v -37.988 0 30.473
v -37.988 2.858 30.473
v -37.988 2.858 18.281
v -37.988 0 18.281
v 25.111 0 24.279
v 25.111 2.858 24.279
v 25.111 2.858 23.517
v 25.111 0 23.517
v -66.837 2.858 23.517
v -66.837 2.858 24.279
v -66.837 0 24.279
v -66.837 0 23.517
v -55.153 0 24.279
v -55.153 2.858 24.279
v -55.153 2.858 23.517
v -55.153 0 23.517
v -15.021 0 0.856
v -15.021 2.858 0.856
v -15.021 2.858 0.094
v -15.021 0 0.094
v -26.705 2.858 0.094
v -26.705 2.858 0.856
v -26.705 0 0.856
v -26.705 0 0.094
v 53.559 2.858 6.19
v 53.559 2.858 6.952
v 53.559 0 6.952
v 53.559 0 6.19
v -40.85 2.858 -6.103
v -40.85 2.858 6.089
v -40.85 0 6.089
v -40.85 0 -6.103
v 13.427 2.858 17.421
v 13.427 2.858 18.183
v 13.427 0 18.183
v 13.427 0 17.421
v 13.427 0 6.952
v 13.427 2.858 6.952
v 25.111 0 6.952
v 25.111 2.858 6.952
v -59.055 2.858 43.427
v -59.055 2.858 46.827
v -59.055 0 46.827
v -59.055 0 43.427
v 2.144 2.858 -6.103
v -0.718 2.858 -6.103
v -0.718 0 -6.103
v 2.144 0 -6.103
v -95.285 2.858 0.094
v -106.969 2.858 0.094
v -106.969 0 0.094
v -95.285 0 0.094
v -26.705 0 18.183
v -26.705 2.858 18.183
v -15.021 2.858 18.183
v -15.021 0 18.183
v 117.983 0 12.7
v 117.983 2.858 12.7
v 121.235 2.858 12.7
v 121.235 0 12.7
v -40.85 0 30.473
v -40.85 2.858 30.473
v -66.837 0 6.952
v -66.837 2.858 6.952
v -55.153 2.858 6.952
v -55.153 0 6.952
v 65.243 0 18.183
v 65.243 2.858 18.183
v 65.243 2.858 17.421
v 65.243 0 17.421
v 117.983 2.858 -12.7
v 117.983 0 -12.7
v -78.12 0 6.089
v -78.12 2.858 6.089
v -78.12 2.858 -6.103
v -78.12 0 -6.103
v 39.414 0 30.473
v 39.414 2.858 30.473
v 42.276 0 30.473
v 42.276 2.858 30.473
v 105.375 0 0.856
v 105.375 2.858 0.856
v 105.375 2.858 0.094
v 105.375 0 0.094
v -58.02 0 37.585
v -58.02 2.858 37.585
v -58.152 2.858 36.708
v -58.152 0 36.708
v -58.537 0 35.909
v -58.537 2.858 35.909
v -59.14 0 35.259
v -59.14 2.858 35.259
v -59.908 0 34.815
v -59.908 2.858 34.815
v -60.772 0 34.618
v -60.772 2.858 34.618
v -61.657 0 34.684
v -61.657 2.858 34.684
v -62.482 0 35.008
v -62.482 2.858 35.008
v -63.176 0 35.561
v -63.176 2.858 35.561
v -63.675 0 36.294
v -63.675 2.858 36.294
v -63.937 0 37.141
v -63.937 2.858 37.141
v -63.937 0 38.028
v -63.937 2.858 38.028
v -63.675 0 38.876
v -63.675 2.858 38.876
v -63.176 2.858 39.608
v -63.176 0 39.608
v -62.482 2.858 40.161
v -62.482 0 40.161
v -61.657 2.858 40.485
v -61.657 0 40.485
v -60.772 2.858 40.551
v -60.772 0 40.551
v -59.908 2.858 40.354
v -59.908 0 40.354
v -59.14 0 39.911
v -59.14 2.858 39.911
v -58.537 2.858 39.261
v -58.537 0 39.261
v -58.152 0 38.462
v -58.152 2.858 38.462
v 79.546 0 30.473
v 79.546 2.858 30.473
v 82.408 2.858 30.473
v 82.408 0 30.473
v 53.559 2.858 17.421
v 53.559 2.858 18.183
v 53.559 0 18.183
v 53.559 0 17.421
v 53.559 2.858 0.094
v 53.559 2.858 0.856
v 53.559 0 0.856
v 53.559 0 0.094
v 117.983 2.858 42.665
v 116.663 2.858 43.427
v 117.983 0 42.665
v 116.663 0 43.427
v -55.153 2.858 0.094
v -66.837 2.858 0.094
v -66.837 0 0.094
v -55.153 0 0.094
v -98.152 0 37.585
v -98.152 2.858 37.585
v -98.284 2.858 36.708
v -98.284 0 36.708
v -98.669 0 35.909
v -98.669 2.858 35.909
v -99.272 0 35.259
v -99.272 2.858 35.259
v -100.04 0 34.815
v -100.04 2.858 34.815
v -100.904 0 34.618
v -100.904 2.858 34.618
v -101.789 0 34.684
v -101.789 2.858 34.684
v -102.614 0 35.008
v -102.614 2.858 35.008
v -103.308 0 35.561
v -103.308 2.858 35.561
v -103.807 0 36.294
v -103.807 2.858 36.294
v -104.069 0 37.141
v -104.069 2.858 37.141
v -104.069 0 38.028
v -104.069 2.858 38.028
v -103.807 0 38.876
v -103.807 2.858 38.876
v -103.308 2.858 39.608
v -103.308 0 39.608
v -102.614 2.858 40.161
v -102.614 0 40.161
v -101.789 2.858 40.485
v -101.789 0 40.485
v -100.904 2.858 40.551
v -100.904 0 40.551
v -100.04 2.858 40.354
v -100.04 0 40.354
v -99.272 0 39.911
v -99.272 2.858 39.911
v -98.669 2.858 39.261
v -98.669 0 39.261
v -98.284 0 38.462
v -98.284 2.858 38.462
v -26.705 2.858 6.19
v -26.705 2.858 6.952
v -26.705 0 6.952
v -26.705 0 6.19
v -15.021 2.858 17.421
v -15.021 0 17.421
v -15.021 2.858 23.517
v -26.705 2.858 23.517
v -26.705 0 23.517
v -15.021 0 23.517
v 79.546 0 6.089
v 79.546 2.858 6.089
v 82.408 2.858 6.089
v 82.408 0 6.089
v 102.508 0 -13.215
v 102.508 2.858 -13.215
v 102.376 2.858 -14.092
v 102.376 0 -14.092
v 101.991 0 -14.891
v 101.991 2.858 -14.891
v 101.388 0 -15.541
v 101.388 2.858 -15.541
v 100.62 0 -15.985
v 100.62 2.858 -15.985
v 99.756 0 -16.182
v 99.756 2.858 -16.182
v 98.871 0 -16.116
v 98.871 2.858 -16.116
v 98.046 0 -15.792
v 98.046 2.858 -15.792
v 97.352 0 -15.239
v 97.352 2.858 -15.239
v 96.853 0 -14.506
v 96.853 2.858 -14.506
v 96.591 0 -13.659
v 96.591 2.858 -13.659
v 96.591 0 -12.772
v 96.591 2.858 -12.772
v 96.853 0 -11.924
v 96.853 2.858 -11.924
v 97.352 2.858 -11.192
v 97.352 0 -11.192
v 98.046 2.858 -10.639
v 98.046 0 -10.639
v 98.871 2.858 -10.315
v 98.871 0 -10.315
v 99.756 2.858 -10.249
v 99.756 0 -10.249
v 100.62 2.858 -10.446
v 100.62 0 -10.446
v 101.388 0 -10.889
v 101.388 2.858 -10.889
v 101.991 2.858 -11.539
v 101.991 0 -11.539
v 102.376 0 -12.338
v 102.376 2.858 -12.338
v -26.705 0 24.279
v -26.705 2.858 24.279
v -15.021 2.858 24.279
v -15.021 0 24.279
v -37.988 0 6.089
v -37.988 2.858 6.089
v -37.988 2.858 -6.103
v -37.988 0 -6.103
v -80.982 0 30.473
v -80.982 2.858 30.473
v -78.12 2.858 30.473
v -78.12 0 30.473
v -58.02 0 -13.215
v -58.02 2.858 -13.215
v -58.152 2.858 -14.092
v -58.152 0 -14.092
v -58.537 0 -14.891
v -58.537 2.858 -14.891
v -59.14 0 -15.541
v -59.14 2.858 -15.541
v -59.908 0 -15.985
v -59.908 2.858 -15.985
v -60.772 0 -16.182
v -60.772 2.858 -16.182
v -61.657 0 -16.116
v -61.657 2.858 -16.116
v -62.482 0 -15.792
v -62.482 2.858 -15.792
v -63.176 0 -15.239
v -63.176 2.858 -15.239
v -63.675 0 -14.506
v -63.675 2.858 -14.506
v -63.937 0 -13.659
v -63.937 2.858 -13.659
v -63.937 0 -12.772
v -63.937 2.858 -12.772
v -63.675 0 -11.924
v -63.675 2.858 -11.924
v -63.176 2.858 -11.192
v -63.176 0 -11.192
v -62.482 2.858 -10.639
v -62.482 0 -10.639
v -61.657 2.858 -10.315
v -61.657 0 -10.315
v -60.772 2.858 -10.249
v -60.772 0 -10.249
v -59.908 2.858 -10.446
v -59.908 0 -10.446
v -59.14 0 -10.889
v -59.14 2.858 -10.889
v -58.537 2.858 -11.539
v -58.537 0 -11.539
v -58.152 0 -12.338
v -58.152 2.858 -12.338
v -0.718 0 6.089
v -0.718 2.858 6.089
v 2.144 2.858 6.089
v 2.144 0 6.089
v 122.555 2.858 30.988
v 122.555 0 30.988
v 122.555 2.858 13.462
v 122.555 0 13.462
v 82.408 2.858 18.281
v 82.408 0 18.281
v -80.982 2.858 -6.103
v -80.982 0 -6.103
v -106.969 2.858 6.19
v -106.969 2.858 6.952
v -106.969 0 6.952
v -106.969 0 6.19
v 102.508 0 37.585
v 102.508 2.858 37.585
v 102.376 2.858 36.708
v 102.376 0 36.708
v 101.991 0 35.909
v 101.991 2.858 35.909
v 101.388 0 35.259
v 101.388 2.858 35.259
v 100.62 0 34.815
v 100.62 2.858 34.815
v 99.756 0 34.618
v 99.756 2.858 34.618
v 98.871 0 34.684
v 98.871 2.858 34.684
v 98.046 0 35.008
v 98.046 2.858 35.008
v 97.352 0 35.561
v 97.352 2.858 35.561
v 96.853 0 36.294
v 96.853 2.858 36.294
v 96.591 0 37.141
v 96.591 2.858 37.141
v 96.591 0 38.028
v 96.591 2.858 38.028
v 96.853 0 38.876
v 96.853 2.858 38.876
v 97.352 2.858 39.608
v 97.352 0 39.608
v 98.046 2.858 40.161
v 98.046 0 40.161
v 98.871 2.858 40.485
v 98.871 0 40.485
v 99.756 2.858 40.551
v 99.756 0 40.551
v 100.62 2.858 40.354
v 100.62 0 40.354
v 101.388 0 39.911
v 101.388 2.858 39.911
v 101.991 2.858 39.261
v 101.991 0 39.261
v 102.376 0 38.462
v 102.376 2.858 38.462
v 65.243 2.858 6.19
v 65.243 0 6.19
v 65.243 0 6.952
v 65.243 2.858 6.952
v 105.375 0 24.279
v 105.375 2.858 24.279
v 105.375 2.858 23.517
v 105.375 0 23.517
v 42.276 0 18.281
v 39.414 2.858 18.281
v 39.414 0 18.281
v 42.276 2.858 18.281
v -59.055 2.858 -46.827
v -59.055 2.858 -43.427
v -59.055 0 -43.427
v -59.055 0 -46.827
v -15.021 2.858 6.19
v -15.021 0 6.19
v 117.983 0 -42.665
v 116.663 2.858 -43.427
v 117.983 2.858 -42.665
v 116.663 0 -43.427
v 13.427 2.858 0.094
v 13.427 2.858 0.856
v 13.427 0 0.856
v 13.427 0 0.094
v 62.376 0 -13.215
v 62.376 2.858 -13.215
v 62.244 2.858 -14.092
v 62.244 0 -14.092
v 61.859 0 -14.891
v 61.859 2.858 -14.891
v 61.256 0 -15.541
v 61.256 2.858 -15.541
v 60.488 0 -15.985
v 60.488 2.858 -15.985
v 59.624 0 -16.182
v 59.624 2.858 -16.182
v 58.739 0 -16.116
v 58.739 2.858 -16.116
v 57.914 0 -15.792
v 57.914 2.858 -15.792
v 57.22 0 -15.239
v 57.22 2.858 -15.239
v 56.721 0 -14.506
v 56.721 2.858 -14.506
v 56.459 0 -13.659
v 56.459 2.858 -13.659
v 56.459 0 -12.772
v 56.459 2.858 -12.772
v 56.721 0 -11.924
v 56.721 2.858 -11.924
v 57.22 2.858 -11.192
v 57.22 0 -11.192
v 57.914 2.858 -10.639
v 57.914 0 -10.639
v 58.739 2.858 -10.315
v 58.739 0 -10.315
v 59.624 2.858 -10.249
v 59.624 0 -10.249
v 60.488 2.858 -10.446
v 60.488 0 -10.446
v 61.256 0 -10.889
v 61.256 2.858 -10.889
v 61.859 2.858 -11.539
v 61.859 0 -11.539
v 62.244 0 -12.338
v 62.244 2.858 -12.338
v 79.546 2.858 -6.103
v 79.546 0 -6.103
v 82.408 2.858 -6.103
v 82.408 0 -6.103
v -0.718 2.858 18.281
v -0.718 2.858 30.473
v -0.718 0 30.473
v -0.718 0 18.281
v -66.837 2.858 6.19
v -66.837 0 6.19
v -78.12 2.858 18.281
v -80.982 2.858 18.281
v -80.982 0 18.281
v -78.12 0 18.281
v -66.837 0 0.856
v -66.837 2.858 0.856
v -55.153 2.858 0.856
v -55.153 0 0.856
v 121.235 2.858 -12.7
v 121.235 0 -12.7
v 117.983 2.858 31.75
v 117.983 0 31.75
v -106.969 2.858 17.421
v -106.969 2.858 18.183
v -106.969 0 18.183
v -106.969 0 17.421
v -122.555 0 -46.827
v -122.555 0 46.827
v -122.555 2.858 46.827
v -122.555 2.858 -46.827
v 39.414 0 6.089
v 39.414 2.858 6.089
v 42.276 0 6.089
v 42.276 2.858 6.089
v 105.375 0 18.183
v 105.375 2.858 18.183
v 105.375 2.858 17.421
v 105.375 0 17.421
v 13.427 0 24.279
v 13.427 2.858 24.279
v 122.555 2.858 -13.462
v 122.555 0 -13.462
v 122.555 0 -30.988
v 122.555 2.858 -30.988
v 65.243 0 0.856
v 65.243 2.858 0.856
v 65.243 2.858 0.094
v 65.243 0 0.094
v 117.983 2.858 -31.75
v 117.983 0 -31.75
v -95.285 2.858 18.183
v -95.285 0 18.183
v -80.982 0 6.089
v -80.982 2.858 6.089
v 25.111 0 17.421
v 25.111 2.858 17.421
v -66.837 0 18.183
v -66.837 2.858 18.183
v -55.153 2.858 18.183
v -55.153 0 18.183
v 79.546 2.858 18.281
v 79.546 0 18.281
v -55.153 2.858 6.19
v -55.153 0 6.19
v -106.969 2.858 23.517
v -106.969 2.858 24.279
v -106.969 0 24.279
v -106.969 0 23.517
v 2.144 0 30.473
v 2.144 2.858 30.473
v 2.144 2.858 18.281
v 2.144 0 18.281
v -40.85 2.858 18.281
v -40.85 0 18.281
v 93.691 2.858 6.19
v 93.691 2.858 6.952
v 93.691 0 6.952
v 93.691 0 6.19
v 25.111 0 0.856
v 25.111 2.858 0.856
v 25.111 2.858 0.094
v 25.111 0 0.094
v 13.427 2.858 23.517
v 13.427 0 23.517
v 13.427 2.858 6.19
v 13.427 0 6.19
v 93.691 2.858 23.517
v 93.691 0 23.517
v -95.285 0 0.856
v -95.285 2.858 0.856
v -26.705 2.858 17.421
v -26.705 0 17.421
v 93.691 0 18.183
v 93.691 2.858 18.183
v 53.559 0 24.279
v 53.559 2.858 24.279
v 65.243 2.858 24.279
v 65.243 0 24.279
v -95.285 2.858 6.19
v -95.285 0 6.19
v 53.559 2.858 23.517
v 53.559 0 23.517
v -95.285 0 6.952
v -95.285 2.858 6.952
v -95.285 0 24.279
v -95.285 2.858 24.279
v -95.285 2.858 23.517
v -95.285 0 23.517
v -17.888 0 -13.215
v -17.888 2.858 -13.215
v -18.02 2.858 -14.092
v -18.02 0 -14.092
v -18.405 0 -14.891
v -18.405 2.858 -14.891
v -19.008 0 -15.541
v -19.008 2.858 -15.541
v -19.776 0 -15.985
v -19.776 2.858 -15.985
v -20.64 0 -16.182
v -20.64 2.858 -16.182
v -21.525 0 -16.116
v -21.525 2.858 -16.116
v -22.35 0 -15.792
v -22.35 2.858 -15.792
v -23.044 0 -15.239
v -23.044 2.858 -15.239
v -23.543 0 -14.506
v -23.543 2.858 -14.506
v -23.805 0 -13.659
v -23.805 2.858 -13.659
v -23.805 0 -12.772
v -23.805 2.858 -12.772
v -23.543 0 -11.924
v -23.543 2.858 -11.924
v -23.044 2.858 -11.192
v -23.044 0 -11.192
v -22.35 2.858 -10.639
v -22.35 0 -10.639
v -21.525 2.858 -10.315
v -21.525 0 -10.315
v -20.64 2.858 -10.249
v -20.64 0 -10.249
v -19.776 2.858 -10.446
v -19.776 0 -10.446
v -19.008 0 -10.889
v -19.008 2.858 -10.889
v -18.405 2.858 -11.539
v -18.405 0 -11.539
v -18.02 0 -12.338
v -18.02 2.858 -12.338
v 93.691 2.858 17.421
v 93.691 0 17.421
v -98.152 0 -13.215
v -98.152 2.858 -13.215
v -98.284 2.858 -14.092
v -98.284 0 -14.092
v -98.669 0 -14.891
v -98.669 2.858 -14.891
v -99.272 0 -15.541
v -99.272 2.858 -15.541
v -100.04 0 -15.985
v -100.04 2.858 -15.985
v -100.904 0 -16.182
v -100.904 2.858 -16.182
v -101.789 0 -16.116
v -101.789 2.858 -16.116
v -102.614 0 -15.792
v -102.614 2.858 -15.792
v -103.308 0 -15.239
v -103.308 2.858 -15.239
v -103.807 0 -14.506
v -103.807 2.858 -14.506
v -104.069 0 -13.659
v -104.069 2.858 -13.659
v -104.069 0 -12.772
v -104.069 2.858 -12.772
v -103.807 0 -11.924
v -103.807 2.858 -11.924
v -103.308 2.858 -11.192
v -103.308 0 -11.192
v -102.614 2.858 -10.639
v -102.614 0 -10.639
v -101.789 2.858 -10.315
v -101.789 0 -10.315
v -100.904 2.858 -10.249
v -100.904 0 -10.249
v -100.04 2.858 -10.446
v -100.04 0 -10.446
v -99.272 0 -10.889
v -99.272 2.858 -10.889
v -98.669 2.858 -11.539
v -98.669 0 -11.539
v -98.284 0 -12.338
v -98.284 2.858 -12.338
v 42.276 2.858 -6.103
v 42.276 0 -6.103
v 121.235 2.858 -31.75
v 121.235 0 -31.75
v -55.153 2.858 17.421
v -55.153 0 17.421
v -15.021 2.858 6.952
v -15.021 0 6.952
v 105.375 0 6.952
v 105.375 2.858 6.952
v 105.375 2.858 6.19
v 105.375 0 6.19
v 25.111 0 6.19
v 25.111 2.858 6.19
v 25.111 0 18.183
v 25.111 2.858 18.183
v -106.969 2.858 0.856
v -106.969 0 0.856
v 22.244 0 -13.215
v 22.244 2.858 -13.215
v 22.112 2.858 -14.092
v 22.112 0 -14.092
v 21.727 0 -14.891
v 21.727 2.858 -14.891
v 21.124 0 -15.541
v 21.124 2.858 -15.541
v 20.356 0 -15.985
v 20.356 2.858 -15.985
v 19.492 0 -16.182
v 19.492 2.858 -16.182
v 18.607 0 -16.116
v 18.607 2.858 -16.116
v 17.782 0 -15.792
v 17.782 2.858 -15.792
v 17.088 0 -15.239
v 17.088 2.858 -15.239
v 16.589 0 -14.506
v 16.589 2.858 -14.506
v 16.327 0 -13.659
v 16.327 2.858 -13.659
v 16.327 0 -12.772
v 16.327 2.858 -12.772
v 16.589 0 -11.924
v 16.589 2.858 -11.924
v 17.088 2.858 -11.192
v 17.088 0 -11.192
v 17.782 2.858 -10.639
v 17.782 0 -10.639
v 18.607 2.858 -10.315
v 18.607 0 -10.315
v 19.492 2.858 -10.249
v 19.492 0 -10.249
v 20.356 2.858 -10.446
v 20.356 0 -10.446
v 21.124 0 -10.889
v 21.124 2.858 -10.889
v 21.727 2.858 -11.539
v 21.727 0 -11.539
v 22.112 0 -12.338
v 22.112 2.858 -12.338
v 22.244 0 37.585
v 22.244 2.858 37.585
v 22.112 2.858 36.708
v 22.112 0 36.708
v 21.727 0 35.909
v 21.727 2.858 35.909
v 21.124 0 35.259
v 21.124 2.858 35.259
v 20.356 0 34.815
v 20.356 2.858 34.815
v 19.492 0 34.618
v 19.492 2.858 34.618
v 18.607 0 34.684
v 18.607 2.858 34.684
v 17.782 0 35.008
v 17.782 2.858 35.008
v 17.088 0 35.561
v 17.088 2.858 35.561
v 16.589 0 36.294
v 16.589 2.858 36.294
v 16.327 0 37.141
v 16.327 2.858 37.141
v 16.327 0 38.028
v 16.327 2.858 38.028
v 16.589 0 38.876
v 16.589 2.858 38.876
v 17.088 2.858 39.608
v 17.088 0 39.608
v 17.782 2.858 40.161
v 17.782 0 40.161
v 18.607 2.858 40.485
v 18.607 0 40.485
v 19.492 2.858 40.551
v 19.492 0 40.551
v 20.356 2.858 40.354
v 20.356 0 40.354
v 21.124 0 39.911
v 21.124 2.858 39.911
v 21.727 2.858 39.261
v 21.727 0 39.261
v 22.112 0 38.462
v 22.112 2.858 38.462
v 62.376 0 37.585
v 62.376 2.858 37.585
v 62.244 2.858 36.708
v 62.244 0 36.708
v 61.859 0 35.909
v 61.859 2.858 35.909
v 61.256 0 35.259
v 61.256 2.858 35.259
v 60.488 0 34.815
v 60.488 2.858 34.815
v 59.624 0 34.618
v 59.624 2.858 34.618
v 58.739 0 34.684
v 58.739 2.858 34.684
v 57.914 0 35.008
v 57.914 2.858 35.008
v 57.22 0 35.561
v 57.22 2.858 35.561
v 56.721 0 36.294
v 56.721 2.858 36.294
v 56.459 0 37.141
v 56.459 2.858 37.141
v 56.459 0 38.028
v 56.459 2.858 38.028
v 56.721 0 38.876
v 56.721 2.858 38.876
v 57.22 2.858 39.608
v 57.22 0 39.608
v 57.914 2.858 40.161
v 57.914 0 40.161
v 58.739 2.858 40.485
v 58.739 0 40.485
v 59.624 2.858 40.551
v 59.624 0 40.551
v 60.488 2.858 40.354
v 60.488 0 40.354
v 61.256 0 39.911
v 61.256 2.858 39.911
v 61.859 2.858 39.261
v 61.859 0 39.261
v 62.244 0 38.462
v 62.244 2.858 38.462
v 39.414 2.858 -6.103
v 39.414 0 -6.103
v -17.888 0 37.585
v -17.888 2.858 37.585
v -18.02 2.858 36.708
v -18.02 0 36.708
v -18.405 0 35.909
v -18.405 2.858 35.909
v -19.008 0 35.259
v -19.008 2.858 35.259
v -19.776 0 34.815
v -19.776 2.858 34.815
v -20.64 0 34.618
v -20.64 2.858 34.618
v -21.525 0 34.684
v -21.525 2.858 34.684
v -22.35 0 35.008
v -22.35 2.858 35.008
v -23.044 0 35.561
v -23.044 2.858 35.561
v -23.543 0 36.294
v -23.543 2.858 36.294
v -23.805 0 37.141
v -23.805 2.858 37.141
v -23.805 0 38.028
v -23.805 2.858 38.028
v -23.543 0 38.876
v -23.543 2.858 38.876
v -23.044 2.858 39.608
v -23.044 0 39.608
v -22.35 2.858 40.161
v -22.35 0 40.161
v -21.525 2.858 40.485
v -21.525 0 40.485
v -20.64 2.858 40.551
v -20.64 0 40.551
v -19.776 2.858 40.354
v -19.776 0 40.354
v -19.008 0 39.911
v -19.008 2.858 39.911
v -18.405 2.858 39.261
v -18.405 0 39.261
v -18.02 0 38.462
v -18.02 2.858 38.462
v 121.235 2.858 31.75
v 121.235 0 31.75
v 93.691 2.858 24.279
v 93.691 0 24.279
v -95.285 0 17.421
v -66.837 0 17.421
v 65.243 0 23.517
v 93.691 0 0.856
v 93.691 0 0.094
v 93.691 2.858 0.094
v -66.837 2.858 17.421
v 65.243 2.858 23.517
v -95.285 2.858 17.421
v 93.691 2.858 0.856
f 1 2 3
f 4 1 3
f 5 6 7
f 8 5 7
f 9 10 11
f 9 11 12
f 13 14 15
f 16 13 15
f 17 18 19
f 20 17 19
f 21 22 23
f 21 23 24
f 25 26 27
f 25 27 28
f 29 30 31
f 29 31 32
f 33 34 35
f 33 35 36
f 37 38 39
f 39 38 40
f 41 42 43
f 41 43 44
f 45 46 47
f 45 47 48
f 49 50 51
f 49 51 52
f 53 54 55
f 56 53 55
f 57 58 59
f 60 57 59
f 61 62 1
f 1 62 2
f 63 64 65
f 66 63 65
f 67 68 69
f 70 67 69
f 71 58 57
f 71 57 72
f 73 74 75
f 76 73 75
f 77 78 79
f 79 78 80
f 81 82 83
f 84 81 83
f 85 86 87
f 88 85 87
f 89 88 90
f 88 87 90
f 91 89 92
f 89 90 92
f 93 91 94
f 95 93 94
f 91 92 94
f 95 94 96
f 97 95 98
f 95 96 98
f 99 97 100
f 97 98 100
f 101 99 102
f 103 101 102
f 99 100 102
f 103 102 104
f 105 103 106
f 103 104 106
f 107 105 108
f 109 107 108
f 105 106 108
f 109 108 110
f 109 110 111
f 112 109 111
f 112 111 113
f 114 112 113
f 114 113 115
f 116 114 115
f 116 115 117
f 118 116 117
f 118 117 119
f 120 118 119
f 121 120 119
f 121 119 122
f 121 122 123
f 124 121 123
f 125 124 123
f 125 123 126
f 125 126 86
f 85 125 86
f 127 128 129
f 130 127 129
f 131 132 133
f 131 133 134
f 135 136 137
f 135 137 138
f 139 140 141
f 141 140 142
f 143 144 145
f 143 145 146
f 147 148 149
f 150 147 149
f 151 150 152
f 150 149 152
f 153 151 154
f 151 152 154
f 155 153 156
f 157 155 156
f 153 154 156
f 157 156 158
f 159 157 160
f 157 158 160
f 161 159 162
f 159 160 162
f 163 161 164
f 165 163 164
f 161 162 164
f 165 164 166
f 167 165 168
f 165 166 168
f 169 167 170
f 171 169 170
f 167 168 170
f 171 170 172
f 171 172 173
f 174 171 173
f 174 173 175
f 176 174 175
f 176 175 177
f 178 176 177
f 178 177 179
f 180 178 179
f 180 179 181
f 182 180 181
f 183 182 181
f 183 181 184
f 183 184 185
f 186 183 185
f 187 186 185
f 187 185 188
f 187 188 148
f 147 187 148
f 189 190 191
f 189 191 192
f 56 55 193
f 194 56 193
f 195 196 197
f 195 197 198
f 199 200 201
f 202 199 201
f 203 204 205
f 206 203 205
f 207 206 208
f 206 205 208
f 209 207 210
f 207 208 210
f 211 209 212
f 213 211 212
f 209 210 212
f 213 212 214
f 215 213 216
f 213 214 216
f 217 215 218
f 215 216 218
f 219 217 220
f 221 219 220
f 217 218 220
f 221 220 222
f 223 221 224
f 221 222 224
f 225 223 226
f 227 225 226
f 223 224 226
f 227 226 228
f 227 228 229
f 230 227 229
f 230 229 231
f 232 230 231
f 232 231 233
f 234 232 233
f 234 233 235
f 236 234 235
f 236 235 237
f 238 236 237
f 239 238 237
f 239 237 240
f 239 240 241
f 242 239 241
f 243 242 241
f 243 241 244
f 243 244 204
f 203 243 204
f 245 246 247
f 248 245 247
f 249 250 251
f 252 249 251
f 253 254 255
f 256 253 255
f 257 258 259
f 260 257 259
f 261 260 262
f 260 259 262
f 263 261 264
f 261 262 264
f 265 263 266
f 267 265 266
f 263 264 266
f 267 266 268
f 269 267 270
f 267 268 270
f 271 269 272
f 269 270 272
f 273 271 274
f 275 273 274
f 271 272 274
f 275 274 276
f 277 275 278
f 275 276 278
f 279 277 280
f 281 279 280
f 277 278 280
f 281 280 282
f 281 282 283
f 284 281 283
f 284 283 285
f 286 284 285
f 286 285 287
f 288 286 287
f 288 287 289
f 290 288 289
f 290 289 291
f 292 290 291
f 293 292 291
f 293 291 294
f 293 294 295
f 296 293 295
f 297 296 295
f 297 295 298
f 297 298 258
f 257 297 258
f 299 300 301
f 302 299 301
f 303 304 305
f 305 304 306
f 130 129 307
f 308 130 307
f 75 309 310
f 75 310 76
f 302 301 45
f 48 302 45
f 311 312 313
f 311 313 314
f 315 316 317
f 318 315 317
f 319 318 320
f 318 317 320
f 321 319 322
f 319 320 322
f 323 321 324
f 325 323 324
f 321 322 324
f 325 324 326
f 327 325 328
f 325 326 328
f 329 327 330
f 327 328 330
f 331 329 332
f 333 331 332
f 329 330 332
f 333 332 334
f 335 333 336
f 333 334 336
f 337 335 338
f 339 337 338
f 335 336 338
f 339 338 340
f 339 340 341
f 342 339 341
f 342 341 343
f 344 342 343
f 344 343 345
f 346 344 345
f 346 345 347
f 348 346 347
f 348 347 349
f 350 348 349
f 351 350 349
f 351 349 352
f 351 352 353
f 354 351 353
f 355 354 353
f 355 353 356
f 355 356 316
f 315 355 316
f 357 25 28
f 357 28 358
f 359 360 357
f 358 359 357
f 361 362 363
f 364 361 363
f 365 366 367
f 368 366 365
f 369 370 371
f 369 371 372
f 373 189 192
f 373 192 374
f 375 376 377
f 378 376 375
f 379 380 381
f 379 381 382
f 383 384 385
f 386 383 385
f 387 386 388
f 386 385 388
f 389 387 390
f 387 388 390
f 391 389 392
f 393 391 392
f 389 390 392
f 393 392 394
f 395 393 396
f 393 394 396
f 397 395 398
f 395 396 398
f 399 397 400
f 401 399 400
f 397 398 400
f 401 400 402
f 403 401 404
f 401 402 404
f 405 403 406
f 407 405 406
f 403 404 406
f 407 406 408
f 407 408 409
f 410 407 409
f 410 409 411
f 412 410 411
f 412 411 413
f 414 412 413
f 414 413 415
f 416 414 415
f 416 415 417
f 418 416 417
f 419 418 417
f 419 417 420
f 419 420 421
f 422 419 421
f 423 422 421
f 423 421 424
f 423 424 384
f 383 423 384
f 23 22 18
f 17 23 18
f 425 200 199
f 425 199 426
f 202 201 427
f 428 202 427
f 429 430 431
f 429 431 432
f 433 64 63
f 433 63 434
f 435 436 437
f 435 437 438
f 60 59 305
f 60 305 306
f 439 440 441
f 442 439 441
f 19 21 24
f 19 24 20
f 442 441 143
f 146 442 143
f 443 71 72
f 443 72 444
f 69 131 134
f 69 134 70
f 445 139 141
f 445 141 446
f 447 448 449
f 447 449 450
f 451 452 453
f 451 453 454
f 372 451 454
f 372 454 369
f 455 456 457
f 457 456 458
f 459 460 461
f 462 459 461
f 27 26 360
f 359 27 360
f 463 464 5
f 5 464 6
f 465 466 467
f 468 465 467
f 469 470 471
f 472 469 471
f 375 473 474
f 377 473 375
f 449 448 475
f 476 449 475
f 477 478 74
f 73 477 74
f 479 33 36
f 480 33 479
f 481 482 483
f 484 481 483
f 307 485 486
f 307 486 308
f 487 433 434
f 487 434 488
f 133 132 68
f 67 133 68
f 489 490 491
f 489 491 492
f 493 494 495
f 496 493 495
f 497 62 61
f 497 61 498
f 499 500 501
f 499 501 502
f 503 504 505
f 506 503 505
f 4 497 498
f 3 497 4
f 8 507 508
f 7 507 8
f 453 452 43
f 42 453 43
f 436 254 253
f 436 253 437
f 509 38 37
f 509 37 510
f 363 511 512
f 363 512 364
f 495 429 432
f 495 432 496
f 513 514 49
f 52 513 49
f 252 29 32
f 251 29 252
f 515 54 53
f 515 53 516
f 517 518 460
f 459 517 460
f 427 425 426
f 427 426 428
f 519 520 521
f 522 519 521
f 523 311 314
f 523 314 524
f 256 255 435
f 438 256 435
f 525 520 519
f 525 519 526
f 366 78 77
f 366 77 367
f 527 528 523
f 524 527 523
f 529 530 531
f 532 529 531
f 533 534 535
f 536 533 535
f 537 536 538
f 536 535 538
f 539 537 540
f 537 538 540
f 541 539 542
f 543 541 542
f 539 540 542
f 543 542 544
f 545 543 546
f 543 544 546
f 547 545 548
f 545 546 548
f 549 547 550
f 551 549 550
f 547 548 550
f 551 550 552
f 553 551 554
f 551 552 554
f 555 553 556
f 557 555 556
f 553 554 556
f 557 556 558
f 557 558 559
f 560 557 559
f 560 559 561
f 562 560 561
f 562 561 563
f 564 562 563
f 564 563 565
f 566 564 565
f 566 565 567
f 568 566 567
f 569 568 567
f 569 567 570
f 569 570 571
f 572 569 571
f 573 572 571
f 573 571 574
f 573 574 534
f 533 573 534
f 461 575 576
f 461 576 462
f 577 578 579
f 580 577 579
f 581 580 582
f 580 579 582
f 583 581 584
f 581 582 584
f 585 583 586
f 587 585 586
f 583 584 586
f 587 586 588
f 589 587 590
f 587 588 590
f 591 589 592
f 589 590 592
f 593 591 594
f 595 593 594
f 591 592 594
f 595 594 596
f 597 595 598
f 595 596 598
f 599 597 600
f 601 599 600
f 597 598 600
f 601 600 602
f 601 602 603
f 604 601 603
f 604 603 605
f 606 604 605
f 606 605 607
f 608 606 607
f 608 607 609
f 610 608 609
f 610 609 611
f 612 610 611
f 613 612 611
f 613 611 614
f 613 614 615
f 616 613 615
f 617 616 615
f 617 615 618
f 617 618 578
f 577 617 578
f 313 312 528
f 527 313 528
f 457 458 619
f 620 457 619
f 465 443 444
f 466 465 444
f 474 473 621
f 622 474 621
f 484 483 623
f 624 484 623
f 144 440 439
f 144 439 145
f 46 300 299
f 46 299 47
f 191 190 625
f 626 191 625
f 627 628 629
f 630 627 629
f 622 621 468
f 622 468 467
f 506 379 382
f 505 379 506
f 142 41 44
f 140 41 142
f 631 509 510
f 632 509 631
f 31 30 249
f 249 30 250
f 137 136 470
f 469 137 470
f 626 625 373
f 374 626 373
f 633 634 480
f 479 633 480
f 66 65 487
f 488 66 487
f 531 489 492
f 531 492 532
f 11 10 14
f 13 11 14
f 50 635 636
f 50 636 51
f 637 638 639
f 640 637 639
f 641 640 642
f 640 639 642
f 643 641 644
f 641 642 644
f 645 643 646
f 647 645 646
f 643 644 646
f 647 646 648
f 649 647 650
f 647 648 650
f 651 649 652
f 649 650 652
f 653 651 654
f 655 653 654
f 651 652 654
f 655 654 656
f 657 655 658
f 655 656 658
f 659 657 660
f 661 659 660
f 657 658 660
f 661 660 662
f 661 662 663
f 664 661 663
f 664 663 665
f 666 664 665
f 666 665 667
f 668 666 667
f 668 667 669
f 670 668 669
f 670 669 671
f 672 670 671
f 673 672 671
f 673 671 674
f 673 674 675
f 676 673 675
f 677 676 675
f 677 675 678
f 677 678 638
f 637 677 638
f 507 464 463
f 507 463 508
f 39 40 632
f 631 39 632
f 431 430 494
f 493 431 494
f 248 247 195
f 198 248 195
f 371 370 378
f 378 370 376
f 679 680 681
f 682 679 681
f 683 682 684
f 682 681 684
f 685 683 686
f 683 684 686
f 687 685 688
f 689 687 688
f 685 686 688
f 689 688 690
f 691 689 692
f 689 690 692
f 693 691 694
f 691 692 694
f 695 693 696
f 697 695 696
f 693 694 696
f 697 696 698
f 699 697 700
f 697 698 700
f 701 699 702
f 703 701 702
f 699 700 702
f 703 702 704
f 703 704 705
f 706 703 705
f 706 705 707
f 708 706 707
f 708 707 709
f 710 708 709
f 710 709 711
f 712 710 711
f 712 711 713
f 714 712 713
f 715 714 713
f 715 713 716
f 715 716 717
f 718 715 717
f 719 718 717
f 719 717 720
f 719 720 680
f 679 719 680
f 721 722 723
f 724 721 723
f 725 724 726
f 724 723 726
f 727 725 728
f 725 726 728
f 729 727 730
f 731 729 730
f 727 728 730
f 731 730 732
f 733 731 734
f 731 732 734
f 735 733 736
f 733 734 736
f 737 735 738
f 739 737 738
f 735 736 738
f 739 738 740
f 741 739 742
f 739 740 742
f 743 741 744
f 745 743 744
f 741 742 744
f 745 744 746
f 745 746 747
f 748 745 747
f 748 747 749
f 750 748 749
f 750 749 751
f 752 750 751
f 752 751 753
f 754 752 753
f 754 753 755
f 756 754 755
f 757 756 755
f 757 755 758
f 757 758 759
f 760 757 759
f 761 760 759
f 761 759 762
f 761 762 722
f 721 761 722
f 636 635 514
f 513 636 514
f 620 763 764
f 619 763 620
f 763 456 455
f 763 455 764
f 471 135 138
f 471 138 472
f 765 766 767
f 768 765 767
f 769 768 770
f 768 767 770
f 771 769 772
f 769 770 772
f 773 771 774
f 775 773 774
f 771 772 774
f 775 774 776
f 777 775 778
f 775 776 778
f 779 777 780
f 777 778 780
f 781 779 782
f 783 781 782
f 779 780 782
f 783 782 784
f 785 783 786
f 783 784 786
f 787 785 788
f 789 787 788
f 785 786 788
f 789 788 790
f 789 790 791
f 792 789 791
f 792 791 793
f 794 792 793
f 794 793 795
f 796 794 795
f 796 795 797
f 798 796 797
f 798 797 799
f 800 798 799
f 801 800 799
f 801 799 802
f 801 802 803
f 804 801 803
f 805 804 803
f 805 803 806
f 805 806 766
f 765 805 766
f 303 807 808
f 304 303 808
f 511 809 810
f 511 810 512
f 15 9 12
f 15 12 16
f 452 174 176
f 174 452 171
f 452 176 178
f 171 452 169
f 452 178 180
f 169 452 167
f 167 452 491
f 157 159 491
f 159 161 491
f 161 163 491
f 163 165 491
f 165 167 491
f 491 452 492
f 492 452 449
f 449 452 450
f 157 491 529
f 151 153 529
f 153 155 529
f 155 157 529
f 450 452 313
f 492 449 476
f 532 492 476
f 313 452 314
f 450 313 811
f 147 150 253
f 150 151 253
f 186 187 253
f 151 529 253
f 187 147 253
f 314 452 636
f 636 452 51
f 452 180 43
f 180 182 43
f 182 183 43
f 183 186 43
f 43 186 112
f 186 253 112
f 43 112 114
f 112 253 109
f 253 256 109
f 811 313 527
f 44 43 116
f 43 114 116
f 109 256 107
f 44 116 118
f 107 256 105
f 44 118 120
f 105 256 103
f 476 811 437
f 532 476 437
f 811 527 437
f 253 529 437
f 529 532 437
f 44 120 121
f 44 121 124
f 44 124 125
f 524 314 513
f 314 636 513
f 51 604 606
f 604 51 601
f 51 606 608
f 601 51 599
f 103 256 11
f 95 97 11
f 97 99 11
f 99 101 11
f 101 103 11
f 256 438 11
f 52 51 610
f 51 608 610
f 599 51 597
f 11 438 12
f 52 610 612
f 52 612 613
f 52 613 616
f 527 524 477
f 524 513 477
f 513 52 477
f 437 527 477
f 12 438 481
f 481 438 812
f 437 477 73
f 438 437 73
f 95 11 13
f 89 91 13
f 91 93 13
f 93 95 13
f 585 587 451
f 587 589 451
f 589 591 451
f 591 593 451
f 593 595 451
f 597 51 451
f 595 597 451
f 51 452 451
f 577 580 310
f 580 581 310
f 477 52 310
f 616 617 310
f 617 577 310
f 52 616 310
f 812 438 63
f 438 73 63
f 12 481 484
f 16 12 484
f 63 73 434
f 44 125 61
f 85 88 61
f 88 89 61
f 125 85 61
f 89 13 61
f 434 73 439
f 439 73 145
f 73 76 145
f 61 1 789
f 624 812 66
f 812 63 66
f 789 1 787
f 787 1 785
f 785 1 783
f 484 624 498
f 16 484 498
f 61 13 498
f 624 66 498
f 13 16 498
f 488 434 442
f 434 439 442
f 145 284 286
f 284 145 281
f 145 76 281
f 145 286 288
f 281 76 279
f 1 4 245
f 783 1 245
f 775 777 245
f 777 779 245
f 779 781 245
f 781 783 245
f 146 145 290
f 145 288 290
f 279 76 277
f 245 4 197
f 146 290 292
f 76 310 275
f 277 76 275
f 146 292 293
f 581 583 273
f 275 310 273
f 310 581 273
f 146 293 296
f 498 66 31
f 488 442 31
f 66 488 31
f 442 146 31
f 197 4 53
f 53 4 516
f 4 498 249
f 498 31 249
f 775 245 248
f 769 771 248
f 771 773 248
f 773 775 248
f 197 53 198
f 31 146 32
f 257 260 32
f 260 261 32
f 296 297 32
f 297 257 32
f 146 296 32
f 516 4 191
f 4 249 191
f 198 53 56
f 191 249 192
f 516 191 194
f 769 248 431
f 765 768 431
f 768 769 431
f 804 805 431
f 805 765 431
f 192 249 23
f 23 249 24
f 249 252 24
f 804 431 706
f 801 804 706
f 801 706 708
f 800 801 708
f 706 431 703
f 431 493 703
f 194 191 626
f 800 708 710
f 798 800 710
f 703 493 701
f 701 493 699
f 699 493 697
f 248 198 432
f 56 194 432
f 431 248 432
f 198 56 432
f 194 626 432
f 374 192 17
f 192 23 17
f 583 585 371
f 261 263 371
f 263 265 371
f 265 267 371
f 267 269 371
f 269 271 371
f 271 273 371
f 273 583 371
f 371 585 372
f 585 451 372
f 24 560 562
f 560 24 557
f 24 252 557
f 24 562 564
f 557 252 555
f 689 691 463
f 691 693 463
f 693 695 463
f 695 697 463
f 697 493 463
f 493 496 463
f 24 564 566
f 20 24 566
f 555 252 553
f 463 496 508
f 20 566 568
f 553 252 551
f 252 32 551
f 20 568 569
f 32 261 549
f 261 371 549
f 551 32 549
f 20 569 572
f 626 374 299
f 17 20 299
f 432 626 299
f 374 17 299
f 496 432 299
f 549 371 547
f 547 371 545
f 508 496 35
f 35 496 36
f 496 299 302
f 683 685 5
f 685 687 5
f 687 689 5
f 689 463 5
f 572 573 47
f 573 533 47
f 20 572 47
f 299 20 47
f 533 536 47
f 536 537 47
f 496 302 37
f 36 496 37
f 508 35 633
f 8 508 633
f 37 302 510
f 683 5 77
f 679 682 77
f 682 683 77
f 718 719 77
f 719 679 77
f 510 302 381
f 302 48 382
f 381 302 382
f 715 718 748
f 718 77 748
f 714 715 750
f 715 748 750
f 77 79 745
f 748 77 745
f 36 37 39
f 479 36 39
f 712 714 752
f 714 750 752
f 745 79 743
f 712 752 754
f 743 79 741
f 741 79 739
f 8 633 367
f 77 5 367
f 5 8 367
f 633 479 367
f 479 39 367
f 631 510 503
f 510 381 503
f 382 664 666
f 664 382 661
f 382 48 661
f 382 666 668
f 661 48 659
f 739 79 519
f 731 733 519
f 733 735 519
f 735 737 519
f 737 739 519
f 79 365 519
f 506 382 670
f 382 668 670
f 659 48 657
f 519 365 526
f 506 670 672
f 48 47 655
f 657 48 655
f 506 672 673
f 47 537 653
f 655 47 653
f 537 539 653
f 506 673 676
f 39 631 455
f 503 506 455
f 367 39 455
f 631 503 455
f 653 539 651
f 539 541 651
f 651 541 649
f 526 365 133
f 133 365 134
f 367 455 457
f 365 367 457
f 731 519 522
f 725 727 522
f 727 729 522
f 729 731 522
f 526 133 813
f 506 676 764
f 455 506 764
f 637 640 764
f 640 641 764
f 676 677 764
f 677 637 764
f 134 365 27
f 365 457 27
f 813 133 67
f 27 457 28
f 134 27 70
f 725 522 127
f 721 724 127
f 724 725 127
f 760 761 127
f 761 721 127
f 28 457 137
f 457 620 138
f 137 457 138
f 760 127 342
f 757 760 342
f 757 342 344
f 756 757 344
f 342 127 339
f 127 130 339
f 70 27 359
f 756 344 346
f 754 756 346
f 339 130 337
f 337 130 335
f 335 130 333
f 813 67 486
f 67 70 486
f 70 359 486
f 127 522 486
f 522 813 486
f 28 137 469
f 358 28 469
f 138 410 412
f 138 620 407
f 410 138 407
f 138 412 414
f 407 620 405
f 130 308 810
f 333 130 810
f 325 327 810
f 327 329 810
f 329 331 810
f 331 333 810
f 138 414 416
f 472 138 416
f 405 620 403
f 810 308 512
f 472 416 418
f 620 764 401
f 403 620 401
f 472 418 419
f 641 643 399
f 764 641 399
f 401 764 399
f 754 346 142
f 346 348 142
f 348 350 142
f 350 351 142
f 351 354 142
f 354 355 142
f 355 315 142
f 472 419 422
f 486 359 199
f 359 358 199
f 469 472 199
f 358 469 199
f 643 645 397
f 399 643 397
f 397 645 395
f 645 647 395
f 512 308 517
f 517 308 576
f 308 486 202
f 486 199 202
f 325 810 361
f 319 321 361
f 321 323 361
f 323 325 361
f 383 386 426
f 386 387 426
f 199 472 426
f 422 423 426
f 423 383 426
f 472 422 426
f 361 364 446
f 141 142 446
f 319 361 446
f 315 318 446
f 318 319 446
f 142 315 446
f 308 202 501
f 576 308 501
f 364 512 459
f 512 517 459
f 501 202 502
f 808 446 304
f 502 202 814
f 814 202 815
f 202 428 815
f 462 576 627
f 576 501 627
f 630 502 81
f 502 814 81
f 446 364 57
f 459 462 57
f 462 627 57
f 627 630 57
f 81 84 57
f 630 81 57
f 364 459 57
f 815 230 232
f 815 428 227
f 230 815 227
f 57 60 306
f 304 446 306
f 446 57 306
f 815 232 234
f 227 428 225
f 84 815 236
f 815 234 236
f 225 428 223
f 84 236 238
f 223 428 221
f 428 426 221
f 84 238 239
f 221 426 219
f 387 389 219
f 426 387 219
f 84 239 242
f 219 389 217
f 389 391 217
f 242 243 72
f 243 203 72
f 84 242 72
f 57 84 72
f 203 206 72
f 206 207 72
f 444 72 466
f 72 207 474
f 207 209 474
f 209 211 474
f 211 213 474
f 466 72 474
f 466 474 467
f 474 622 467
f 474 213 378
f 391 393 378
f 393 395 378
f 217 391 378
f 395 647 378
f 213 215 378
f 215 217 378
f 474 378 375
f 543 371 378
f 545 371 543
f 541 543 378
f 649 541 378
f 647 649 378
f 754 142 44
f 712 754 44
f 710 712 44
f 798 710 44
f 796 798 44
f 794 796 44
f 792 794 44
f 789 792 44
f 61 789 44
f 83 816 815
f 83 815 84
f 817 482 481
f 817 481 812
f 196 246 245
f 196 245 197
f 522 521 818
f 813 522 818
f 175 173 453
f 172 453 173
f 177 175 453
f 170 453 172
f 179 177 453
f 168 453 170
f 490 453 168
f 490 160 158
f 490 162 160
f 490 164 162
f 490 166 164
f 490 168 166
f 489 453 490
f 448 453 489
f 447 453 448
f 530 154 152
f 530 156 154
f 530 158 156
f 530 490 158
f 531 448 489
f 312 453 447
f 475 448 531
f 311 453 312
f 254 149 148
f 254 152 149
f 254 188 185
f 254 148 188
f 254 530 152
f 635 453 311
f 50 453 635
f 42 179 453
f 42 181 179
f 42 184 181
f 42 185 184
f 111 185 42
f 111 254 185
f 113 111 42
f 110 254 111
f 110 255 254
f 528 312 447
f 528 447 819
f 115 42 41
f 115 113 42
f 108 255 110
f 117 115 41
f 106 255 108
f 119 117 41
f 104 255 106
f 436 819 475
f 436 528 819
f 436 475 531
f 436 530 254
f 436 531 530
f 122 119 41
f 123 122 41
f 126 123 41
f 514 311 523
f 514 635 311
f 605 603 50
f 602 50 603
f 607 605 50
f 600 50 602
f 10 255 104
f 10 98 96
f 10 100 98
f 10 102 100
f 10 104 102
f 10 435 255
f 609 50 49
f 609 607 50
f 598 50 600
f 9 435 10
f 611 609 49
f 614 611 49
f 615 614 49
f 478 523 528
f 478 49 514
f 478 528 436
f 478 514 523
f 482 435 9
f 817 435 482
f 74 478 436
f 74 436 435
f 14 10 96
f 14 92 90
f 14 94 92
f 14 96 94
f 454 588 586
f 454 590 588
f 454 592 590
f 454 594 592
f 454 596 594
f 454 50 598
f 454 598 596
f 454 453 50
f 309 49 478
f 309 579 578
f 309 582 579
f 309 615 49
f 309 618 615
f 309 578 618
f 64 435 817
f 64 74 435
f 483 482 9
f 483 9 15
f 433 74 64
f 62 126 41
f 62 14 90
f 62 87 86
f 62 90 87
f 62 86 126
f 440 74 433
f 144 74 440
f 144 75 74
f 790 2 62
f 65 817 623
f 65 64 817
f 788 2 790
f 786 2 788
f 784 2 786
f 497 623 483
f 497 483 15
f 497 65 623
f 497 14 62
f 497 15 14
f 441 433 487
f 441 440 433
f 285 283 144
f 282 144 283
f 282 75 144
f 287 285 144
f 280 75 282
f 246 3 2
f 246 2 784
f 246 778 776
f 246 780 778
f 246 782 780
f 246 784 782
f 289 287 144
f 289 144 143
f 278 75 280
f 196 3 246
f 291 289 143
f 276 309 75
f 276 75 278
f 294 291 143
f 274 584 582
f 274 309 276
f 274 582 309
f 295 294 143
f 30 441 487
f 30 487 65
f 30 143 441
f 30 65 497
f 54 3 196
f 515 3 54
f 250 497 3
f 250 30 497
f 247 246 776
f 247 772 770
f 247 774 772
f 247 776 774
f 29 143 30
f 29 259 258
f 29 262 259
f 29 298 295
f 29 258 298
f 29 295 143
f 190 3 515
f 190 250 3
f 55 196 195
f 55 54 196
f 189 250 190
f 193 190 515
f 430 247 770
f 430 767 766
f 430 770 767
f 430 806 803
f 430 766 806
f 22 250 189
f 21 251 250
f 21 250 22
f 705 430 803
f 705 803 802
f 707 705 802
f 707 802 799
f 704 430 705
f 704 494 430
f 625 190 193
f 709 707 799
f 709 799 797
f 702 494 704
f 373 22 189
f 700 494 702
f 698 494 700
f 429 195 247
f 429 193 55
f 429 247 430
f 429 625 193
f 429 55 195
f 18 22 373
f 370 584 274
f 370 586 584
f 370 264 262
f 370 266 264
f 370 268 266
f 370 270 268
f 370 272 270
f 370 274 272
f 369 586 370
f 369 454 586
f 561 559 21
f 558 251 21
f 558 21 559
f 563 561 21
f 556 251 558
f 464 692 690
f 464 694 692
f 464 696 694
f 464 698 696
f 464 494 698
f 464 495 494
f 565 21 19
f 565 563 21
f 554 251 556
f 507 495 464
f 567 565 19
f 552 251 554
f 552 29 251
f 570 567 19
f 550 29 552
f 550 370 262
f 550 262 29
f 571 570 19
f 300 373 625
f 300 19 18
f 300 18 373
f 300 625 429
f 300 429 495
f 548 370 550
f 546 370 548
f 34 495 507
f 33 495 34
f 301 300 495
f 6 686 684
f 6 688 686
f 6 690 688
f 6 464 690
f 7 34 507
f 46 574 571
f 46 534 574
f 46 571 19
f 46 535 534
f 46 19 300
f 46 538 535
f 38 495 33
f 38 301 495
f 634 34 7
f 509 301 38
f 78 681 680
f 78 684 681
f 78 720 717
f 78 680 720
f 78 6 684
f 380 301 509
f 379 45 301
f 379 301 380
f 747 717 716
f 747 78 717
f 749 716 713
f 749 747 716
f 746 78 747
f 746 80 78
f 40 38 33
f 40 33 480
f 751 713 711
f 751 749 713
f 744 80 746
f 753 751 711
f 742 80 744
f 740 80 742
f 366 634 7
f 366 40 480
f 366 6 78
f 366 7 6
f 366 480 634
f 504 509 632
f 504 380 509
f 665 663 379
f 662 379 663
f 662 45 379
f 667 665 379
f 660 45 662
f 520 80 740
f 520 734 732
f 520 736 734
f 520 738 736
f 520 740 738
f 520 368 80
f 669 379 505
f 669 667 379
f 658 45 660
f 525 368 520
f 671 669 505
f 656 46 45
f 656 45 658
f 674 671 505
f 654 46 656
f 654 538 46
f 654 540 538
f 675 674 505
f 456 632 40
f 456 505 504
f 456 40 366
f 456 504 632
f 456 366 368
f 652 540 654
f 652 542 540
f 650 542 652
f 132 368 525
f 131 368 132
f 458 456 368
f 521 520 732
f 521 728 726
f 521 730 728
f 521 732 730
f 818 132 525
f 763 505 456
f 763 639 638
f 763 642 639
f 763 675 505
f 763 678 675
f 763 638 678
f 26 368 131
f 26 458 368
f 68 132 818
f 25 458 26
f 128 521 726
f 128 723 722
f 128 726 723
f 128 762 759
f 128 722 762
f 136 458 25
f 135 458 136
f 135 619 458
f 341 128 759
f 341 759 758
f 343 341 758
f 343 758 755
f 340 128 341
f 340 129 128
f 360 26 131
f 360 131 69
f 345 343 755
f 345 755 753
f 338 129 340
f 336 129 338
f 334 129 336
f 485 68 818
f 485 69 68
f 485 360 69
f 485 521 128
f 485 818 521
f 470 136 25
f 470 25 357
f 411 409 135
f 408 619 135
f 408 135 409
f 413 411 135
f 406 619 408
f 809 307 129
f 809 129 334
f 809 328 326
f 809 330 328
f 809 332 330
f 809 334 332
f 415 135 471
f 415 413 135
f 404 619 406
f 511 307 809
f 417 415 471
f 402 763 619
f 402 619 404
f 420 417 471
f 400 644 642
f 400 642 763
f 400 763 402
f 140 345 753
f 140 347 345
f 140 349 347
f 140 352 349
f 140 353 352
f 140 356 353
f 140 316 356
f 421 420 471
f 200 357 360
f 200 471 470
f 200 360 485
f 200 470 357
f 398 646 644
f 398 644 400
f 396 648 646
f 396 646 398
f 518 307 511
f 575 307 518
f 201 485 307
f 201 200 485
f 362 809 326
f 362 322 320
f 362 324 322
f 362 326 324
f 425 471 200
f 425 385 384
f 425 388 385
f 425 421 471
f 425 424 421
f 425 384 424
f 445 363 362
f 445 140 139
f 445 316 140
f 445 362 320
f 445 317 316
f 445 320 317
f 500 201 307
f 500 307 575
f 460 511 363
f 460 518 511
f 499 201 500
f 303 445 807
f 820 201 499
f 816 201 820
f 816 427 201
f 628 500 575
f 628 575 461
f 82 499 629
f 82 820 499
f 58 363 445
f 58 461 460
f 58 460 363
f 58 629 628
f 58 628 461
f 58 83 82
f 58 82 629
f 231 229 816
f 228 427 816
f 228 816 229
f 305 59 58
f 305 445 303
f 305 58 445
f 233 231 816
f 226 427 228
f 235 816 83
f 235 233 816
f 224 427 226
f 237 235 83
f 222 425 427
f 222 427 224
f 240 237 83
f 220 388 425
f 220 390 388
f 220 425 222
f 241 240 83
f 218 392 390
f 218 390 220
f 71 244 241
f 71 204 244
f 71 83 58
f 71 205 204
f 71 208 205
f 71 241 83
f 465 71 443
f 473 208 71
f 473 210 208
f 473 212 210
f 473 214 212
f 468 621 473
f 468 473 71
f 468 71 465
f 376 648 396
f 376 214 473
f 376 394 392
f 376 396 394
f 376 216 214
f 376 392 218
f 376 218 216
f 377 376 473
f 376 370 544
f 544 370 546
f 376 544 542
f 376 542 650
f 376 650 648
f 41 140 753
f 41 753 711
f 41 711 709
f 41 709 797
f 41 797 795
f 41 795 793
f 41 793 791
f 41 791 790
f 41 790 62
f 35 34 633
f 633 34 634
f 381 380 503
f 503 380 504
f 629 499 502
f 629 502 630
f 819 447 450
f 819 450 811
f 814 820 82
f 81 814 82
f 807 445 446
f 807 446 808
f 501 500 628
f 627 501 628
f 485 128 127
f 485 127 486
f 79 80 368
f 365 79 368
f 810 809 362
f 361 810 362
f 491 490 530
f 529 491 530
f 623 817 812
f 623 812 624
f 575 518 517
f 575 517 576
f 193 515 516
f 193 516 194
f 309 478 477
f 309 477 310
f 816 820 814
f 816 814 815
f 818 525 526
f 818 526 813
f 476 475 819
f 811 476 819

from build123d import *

# Parameters (mm, degrees)
SKETCH1_W             = 245.11
SKETCH1_H             = 93.653112922
BOSS_EXTRUDE1_DEPTH   = 2.8575
CUT_EXTRUDE1_REACH    = 4.857
SKETCH2_W             = 181.61
SKETCH2_H             = 3.399764473
CUT_EXTRUDE3_REACH    = 4.857
SKETCH4_W             = 4.572
SKETCH4_H             = 11.676791988
SKETCH4_H_2           = 25.4
CHAMFER2_SIZE         = 0.762
CHAMFER2_SIZE2        = 1.319822715
CHAMFER2_PART_2_SIZE  = 0.762
CHAMFER2_PART_2_SIZE2 = 1.319822715
CHAMFER2_PART_3_SIZE  = 0.762
CHAMFER2_PART_3_SIZE2 = 1.319822715
CHAMFER3_SIZE         = 0.762
CHAMFER3_SIZE2        = 1.319822715
CHAMFER3_PART_2_SIZE  = 0.762
CHAMFER3_PART_2_SIZE2 = 1.319822715
CHAMFER3_PART_3_SIZE  = 0.762
CHAMFER3_PART_3_SIZE2 = 1.319822715
SKETCH6_W             = 11.684
SKETCH6_H             = 0.762
CUT_EXTRUDE4_DEPTH    = 3.8575
SKETCH9_W             = 2.86258
SKETCH9_H             = 12.192
CUT_EXTRUDE5_DEPTH    = 3.8575
SKETCH11_R            = 2.975
CUT_EXTRUDE6_DEPTH    = 3.8575


with BuildPart() as part:
    # Sketch1 → Boss-Extrude1 (new body)
    with BuildSketch(Plane(origin=(0, 0, 0), x_dir=(1, 0, 0), z_dir=(0, 1, 0))):
        Rectangle(SKETCH1_W, SKETCH1_H)
    extrude(amount=BOSS_EXTRUDE1_DEPTH)

    # Sketch2 → Cut-Extrude1 (cut, up to next)
    with BuildSketch(Plane(origin=(0, 2.8575, 0), x_dir=(1, 0, 0), z_dir=(0, 1, 0)), mode=Mode.PRIVATE) as cut_extrude1_sk1:
        with Locations((31.75, 45.126674225)):
            Rectangle(SKETCH2_W, SKETCH2_H)
    cut_extrude1_tool1 = extrude(cut_extrude1_sk1.sketch, amount=-CUT_EXTRUDE1_REACH, mode=Mode.PRIVATE) & part.part
    add(cut_extrude1_tool1.solids().sort_by_distance((31.75, 2.8575, -45.126674))[0], mode=Mode.SUBTRACT)
    # Sketch2 → Cut-Extrude1 (cut, up to next)
    with BuildSketch(Plane(origin=(0, 2.8575, 0), x_dir=(1, 0, 0), z_dir=(0, 1, 0)), mode=Mode.PRIVATE) as cut_extrude1_sk2:
        with Locations((31.75, -45.126674225)):
            Rectangle(SKETCH2_W, SKETCH2_H)
    cut_extrude1_tool2 = extrude(cut_extrude1_sk2.sketch, amount=-CUT_EXTRUDE1_REACH, mode=Mode.PRIVATE) & part.part
    add(cut_extrude1_tool2.solids().sort_by_distance((31.75, 2.8575, 45.126674))[0], mode=Mode.SUBTRACT)

    # Sketch4 → Cut-Extrude3 (cut, up to next)
    with BuildSketch(Plane(origin=(0, 2.8575, 0), x_dir=(1, 0, 0), z_dir=(0, 1, 0)), mode=Mode.PRIVATE) as cut_extrude3_sk1:
        with Locations((120.269, 37.588395994)):
            Rectangle(SKETCH4_W, SKETCH4_H)
    cut_extrude3_tool1 = extrude(cut_extrude3_sk1.sketch, amount=-CUT_EXTRUDE3_REACH, mode=Mode.PRIVATE) & part.part
    add(cut_extrude3_tool1.solids().sort_by_distance((120.269, 2.8575, -37.588396))[0], mode=Mode.SUBTRACT)
    # Sketch4 → Cut-Extrude3 (cut, up to next)
    with BuildSketch(Plane(origin=(0, 2.8575, 0), x_dir=(1, 0, 0), z_dir=(0, 1, 0)), mode=Mode.PRIVATE) as cut_extrude3_sk2:
        with Locations((120.269, -37.588395994)):
            Rectangle(SKETCH4_W, SKETCH4_H)
    cut_extrude3_tool2 = extrude(cut_extrude3_sk2.sketch, amount=-CUT_EXTRUDE3_REACH, mode=Mode.PRIVATE) & part.part
    add(cut_extrude3_tool2.solids().sort_by_distance((120.269, 2.8575, 37.588396))[0], mode=Mode.SUBTRACT)
    # Sketch4 → Cut-Extrude3 (cut, up to next)
    with BuildSketch(Plane(origin=(0, 2.8575, 0), x_dir=(1, 0, 0), z_dir=(0, 1, 0)), mode=Mode.PRIVATE) as cut_extrude3_sk3:
        with Locations((120.269, 0)):
            Rectangle(SKETCH4_W, SKETCH4_H_2)
    cut_extrude3_tool3 = extrude(cut_extrude3_sk3.sketch, amount=-CUT_EXTRUDE3_REACH, mode=Mode.PRIVATE) & part.part
    add(cut_extrude3_tool3.solids().sort_by_distance((120.269, 2.8575, 0))[0], mode=Mode.SUBTRACT)

    # Chamfer2
    chamfer2_edges = [part.edges().sort_by_distance(p)[0] for p in [
        (122.555, 1.42875, 31.75),
    ]]
    chamfer2_side = [part.faces().sort_by_distance(p)[0] for p in [
        (122.555, 1.42875, 22.225),
    ]]
    chamfer(chamfer2_edges, length=CHAMFER2_SIZE, length2=CHAMFER2_SIZE2, reference=chamfer2_side[0])

    # Chamfer2 part 2
    chamfer2_part_2_edges = [part.edges().sort_by_distance(p)[0] for p in [
        (117.983, 1.42875, 43.426791988),
    ]]
    chamfer2_part_2_side = [part.faces().sort_by_distance(p)[0] for p in [
        (117.983, 1.42875, 37.588395994),
    ]]
    chamfer(chamfer2_part_2_edges, length=CHAMFER2_PART_2_SIZE, length2=CHAMFER2_PART_2_SIZE2, reference=chamfer2_part_2_side[0])

    # Chamfer2 part 3
    chamfer2_part_3_edges = [part.edges().sort_by_distance(p)[0] for p in [
        (122.555, 1.42875, -12.7),
    ]]
    chamfer2_part_3_side = [part.faces().sort_by_distance(p)[0] for p in [
        (122.555, 1.42875, -22.225),
    ]]
    chamfer(chamfer2_part_3_edges, length=CHAMFER2_PART_3_SIZE, length2=CHAMFER2_PART_3_SIZE2, reference=chamfer2_part_3_side[0])

    # Chamfer3
    chamfer3_edges = [part.edges().sort_by_distance(p)[0] for p in [
        (122.555, 1.42875, -31.75),
    ]]
    chamfer3_side = [part.faces().sort_by_distance(p)[0] for p in [
        (122.555, 1.42875, -22.606),
    ]]
    chamfer(chamfer3_edges, length=CHAMFER3_SIZE, length2=CHAMFER3_SIZE2, reference=chamfer3_side[0])

    # Chamfer3 part 2
    chamfer3_part_2_edges = [part.edges().sort_by_distance(p)[0] for p in [
        (117.983, 1.42875, -43.426791988),
    ]]
    chamfer3_part_2_side = [part.faces().sort_by_distance(p)[0] for p in [
        (117.983, 1.42875, -37.588395994),
    ]]
    chamfer(chamfer3_part_2_edges, length=CHAMFER3_PART_2_SIZE, length2=CHAMFER3_PART_2_SIZE2, reference=chamfer3_part_2_side[0])

    # Chamfer3 part 3
    chamfer3_part_3_edges = [part.edges().sort_by_distance(p)[0] for p in [
        (122.555, 1.42875, 12.7),
    ]]
    chamfer3_part_3_side = [part.faces().sort_by_distance(p)[0] for p in [
        (122.555, 1.42875, 21.844),
    ]]
    chamfer(chamfer3_part_3_edges, length=CHAMFER3_PART_3_SIZE, length2=CHAMFER3_PART_3_SIZE2, reference=chamfer3_part_3_side[0])

    # Sketch6 → Cut-Extrude4 (cut, through all)
    with BuildSketch(Plane(origin=(0, 2.8575, 0), x_dir=(1, 0, 0), z_dir=(0, 1, 0))):
        with Locations((99.533234068, -0.475391988)):
            Rectangle(SKETCH6_W, SKETCH6_H)
        with Locations((99.533234068, -6.571391988)):
            Rectangle(SKETCH6_W, SKETCH6_H)
        with Locations((99.533234068, -17.802329902)):
            Rectangle(SKETCH6_W, SKETCH6_H)
        with Locations((99.533234068, -23.898329902)):
            Rectangle(SKETCH6_W, SKETCH6_H)
        with Locations((59.401234068, -0.475391988)):
            Rectangle(SKETCH6_W, SKETCH6_H)
        with Locations((59.401234068, -6.571391988)):
            Rectangle(SKETCH6_W, SKETCH6_H)
        with Locations((59.401234068, -17.802329902)):
            Rectangle(SKETCH6_W, SKETCH6_H)
        with Locations((59.401234068, -23.898329902)):
            Rectangle(SKETCH6_W, SKETCH6_H)
        with Locations((19.269234068, -0.475391988)):
            Rectangle(SKETCH6_W, SKETCH6_H)
        with Locations((19.269234068, -6.571391988)):
            Rectangle(SKETCH6_W, SKETCH6_H)
        with Locations((19.269234068, -17.802329902)):
            Rectangle(SKETCH6_W, SKETCH6_H)
        with Locations((19.269234068, -23.898329902)):
            Rectangle(SKETCH6_W, SKETCH6_H)
        with Locations((-20.862765932, -0.475391988)):
            Rectangle(SKETCH6_W, SKETCH6_H)
        with Locations((-20.862765932, -6.571391988)):
            Rectangle(SKETCH6_W, SKETCH6_H)
        with Locations((-20.862765932, -17.802329902)):
            Rectangle(SKETCH6_W, SKETCH6_H)
        with Locations((-20.862765932, -23.898329902)):
            Rectangle(SKETCH6_W, SKETCH6_H)
        with Locations((-60.994765932, -0.475391988)):
            Rectangle(SKETCH6_W, SKETCH6_H)
        with Locations((-60.994765932, -6.571391988)):
            Rectangle(SKETCH6_W, SKETCH6_H)
        with Locations((-60.994765932, -17.802329902)):
            Rectangle(SKETCH6_W, SKETCH6_H)
        with Locations((-60.994765932, -23.898329902)):
            Rectangle(SKETCH6_W, SKETCH6_H)
        with Locations((-101.126765932, -0.475391988)):
            Rectangle(SKETCH6_W, SKETCH6_H)
        with Locations((-101.126765932, -6.571391988)):
            Rectangle(SKETCH6_W, SKETCH6_H)
        with Locations((-101.126765932, -17.802329902)):
            Rectangle(SKETCH6_W, SKETCH6_H)
        with Locations((-101.126765932, -23.898329902)):
            Rectangle(SKETCH6_W, SKETCH6_H)
    extrude(amount=-CUT_EXTRUDE4_DEPTH, mode=Mode.SUBTRACT)

    # Sketch9 → Cut-Extrude5 (cut, through all)
    with BuildSketch(Plane(origin=(0, 2.8575, 0), x_dir=(1, 0, 0), z_dir=(0, 1, 0))):
        with Locations((80.97711923, 0.007208012)):
            Rectangle(SKETCH9_W, SKETCH9_H)
        with Locations((40.84511923, 0.007208012)):
            Rectangle(SKETCH9_W, SKETCH9_H)
        with Locations((40.84511923, -24.376791988)):
            Rectangle(SKETCH9_W, SKETCH9_H)
        with Locations((0.71311923, 0.007208012)):
            Rectangle(SKETCH9_W, SKETCH9_H)
        with Locations((0.71311923, -24.376791988)):
            Rectangle(SKETCH9_W, SKETCH9_H)
        with Locations((80.97711923, -24.376791988)):
            Rectangle(SKETCH9_W, SKETCH9_H)
        with Locations((-39.41888077, 0.007208012)):
            Rectangle(SKETCH9_W, SKETCH9_H)
        with Locations((-39.41888077, -24.376791988)):
            Rectangle(SKETCH9_W, SKETCH9_H)
        with Locations((-79.55088077, 0.007208012)):
            Rectangle(SKETCH9_W, SKETCH9_H)
        with Locations((-79.55088077, -24.376791988)):
            Rectangle(SKETCH9_W, SKETCH9_H)
    extrude(amount=-CUT_EXTRUDE5_DEPTH, mode=Mode.SUBTRACT)

    # Sketch11 → Cut-Extrude6 (cut, through all)
    with BuildSketch(Plane(origin=(0, 2.8575, 0), x_dir=(1, 0, 0), z_dir=(0, 1, 0))):
        with Locations((99.533234068, 13.215208012)):
            Circle(SKETCH11_R)
        with Locations((99.533234068, -37.584791988)):
            Circle(SKETCH11_R)
        with Locations((59.401234068, -37.584791988)):
            Circle(SKETCH11_R)
        with Locations((59.401234068, 13.215208012)):
            Circle(SKETCH11_R)
        with Locations((19.269234068, -37.584791988)):
            Circle(SKETCH11_R)
        with Locations((19.269234068, 13.215208012)):
            Circle(SKETCH11_R)
        with Locations((-20.862765932, -37.584791988)):
            Circle(SKETCH11_R)
        with Locations((-20.862765932, 13.215208012)):
            Circle(SKETCH11_R)
        with Locations((-60.994765932, -37.584791988)):
            Circle(SKETCH11_R)
        with Locations((-60.994765932, 13.215208012)):
            Circle(SKETCH11_R)
        with Locations((-101.126765932, -37.584791988)):
            Circle(SKETCH11_R)
        with Locations((-101.126765932, 13.215208012)):
            Circle(SKETCH11_R)
    extrude(amount=-CUT_EXTRUDE6_DEPTH, mode=Mode.SUBTRACT)


solid = part.part
